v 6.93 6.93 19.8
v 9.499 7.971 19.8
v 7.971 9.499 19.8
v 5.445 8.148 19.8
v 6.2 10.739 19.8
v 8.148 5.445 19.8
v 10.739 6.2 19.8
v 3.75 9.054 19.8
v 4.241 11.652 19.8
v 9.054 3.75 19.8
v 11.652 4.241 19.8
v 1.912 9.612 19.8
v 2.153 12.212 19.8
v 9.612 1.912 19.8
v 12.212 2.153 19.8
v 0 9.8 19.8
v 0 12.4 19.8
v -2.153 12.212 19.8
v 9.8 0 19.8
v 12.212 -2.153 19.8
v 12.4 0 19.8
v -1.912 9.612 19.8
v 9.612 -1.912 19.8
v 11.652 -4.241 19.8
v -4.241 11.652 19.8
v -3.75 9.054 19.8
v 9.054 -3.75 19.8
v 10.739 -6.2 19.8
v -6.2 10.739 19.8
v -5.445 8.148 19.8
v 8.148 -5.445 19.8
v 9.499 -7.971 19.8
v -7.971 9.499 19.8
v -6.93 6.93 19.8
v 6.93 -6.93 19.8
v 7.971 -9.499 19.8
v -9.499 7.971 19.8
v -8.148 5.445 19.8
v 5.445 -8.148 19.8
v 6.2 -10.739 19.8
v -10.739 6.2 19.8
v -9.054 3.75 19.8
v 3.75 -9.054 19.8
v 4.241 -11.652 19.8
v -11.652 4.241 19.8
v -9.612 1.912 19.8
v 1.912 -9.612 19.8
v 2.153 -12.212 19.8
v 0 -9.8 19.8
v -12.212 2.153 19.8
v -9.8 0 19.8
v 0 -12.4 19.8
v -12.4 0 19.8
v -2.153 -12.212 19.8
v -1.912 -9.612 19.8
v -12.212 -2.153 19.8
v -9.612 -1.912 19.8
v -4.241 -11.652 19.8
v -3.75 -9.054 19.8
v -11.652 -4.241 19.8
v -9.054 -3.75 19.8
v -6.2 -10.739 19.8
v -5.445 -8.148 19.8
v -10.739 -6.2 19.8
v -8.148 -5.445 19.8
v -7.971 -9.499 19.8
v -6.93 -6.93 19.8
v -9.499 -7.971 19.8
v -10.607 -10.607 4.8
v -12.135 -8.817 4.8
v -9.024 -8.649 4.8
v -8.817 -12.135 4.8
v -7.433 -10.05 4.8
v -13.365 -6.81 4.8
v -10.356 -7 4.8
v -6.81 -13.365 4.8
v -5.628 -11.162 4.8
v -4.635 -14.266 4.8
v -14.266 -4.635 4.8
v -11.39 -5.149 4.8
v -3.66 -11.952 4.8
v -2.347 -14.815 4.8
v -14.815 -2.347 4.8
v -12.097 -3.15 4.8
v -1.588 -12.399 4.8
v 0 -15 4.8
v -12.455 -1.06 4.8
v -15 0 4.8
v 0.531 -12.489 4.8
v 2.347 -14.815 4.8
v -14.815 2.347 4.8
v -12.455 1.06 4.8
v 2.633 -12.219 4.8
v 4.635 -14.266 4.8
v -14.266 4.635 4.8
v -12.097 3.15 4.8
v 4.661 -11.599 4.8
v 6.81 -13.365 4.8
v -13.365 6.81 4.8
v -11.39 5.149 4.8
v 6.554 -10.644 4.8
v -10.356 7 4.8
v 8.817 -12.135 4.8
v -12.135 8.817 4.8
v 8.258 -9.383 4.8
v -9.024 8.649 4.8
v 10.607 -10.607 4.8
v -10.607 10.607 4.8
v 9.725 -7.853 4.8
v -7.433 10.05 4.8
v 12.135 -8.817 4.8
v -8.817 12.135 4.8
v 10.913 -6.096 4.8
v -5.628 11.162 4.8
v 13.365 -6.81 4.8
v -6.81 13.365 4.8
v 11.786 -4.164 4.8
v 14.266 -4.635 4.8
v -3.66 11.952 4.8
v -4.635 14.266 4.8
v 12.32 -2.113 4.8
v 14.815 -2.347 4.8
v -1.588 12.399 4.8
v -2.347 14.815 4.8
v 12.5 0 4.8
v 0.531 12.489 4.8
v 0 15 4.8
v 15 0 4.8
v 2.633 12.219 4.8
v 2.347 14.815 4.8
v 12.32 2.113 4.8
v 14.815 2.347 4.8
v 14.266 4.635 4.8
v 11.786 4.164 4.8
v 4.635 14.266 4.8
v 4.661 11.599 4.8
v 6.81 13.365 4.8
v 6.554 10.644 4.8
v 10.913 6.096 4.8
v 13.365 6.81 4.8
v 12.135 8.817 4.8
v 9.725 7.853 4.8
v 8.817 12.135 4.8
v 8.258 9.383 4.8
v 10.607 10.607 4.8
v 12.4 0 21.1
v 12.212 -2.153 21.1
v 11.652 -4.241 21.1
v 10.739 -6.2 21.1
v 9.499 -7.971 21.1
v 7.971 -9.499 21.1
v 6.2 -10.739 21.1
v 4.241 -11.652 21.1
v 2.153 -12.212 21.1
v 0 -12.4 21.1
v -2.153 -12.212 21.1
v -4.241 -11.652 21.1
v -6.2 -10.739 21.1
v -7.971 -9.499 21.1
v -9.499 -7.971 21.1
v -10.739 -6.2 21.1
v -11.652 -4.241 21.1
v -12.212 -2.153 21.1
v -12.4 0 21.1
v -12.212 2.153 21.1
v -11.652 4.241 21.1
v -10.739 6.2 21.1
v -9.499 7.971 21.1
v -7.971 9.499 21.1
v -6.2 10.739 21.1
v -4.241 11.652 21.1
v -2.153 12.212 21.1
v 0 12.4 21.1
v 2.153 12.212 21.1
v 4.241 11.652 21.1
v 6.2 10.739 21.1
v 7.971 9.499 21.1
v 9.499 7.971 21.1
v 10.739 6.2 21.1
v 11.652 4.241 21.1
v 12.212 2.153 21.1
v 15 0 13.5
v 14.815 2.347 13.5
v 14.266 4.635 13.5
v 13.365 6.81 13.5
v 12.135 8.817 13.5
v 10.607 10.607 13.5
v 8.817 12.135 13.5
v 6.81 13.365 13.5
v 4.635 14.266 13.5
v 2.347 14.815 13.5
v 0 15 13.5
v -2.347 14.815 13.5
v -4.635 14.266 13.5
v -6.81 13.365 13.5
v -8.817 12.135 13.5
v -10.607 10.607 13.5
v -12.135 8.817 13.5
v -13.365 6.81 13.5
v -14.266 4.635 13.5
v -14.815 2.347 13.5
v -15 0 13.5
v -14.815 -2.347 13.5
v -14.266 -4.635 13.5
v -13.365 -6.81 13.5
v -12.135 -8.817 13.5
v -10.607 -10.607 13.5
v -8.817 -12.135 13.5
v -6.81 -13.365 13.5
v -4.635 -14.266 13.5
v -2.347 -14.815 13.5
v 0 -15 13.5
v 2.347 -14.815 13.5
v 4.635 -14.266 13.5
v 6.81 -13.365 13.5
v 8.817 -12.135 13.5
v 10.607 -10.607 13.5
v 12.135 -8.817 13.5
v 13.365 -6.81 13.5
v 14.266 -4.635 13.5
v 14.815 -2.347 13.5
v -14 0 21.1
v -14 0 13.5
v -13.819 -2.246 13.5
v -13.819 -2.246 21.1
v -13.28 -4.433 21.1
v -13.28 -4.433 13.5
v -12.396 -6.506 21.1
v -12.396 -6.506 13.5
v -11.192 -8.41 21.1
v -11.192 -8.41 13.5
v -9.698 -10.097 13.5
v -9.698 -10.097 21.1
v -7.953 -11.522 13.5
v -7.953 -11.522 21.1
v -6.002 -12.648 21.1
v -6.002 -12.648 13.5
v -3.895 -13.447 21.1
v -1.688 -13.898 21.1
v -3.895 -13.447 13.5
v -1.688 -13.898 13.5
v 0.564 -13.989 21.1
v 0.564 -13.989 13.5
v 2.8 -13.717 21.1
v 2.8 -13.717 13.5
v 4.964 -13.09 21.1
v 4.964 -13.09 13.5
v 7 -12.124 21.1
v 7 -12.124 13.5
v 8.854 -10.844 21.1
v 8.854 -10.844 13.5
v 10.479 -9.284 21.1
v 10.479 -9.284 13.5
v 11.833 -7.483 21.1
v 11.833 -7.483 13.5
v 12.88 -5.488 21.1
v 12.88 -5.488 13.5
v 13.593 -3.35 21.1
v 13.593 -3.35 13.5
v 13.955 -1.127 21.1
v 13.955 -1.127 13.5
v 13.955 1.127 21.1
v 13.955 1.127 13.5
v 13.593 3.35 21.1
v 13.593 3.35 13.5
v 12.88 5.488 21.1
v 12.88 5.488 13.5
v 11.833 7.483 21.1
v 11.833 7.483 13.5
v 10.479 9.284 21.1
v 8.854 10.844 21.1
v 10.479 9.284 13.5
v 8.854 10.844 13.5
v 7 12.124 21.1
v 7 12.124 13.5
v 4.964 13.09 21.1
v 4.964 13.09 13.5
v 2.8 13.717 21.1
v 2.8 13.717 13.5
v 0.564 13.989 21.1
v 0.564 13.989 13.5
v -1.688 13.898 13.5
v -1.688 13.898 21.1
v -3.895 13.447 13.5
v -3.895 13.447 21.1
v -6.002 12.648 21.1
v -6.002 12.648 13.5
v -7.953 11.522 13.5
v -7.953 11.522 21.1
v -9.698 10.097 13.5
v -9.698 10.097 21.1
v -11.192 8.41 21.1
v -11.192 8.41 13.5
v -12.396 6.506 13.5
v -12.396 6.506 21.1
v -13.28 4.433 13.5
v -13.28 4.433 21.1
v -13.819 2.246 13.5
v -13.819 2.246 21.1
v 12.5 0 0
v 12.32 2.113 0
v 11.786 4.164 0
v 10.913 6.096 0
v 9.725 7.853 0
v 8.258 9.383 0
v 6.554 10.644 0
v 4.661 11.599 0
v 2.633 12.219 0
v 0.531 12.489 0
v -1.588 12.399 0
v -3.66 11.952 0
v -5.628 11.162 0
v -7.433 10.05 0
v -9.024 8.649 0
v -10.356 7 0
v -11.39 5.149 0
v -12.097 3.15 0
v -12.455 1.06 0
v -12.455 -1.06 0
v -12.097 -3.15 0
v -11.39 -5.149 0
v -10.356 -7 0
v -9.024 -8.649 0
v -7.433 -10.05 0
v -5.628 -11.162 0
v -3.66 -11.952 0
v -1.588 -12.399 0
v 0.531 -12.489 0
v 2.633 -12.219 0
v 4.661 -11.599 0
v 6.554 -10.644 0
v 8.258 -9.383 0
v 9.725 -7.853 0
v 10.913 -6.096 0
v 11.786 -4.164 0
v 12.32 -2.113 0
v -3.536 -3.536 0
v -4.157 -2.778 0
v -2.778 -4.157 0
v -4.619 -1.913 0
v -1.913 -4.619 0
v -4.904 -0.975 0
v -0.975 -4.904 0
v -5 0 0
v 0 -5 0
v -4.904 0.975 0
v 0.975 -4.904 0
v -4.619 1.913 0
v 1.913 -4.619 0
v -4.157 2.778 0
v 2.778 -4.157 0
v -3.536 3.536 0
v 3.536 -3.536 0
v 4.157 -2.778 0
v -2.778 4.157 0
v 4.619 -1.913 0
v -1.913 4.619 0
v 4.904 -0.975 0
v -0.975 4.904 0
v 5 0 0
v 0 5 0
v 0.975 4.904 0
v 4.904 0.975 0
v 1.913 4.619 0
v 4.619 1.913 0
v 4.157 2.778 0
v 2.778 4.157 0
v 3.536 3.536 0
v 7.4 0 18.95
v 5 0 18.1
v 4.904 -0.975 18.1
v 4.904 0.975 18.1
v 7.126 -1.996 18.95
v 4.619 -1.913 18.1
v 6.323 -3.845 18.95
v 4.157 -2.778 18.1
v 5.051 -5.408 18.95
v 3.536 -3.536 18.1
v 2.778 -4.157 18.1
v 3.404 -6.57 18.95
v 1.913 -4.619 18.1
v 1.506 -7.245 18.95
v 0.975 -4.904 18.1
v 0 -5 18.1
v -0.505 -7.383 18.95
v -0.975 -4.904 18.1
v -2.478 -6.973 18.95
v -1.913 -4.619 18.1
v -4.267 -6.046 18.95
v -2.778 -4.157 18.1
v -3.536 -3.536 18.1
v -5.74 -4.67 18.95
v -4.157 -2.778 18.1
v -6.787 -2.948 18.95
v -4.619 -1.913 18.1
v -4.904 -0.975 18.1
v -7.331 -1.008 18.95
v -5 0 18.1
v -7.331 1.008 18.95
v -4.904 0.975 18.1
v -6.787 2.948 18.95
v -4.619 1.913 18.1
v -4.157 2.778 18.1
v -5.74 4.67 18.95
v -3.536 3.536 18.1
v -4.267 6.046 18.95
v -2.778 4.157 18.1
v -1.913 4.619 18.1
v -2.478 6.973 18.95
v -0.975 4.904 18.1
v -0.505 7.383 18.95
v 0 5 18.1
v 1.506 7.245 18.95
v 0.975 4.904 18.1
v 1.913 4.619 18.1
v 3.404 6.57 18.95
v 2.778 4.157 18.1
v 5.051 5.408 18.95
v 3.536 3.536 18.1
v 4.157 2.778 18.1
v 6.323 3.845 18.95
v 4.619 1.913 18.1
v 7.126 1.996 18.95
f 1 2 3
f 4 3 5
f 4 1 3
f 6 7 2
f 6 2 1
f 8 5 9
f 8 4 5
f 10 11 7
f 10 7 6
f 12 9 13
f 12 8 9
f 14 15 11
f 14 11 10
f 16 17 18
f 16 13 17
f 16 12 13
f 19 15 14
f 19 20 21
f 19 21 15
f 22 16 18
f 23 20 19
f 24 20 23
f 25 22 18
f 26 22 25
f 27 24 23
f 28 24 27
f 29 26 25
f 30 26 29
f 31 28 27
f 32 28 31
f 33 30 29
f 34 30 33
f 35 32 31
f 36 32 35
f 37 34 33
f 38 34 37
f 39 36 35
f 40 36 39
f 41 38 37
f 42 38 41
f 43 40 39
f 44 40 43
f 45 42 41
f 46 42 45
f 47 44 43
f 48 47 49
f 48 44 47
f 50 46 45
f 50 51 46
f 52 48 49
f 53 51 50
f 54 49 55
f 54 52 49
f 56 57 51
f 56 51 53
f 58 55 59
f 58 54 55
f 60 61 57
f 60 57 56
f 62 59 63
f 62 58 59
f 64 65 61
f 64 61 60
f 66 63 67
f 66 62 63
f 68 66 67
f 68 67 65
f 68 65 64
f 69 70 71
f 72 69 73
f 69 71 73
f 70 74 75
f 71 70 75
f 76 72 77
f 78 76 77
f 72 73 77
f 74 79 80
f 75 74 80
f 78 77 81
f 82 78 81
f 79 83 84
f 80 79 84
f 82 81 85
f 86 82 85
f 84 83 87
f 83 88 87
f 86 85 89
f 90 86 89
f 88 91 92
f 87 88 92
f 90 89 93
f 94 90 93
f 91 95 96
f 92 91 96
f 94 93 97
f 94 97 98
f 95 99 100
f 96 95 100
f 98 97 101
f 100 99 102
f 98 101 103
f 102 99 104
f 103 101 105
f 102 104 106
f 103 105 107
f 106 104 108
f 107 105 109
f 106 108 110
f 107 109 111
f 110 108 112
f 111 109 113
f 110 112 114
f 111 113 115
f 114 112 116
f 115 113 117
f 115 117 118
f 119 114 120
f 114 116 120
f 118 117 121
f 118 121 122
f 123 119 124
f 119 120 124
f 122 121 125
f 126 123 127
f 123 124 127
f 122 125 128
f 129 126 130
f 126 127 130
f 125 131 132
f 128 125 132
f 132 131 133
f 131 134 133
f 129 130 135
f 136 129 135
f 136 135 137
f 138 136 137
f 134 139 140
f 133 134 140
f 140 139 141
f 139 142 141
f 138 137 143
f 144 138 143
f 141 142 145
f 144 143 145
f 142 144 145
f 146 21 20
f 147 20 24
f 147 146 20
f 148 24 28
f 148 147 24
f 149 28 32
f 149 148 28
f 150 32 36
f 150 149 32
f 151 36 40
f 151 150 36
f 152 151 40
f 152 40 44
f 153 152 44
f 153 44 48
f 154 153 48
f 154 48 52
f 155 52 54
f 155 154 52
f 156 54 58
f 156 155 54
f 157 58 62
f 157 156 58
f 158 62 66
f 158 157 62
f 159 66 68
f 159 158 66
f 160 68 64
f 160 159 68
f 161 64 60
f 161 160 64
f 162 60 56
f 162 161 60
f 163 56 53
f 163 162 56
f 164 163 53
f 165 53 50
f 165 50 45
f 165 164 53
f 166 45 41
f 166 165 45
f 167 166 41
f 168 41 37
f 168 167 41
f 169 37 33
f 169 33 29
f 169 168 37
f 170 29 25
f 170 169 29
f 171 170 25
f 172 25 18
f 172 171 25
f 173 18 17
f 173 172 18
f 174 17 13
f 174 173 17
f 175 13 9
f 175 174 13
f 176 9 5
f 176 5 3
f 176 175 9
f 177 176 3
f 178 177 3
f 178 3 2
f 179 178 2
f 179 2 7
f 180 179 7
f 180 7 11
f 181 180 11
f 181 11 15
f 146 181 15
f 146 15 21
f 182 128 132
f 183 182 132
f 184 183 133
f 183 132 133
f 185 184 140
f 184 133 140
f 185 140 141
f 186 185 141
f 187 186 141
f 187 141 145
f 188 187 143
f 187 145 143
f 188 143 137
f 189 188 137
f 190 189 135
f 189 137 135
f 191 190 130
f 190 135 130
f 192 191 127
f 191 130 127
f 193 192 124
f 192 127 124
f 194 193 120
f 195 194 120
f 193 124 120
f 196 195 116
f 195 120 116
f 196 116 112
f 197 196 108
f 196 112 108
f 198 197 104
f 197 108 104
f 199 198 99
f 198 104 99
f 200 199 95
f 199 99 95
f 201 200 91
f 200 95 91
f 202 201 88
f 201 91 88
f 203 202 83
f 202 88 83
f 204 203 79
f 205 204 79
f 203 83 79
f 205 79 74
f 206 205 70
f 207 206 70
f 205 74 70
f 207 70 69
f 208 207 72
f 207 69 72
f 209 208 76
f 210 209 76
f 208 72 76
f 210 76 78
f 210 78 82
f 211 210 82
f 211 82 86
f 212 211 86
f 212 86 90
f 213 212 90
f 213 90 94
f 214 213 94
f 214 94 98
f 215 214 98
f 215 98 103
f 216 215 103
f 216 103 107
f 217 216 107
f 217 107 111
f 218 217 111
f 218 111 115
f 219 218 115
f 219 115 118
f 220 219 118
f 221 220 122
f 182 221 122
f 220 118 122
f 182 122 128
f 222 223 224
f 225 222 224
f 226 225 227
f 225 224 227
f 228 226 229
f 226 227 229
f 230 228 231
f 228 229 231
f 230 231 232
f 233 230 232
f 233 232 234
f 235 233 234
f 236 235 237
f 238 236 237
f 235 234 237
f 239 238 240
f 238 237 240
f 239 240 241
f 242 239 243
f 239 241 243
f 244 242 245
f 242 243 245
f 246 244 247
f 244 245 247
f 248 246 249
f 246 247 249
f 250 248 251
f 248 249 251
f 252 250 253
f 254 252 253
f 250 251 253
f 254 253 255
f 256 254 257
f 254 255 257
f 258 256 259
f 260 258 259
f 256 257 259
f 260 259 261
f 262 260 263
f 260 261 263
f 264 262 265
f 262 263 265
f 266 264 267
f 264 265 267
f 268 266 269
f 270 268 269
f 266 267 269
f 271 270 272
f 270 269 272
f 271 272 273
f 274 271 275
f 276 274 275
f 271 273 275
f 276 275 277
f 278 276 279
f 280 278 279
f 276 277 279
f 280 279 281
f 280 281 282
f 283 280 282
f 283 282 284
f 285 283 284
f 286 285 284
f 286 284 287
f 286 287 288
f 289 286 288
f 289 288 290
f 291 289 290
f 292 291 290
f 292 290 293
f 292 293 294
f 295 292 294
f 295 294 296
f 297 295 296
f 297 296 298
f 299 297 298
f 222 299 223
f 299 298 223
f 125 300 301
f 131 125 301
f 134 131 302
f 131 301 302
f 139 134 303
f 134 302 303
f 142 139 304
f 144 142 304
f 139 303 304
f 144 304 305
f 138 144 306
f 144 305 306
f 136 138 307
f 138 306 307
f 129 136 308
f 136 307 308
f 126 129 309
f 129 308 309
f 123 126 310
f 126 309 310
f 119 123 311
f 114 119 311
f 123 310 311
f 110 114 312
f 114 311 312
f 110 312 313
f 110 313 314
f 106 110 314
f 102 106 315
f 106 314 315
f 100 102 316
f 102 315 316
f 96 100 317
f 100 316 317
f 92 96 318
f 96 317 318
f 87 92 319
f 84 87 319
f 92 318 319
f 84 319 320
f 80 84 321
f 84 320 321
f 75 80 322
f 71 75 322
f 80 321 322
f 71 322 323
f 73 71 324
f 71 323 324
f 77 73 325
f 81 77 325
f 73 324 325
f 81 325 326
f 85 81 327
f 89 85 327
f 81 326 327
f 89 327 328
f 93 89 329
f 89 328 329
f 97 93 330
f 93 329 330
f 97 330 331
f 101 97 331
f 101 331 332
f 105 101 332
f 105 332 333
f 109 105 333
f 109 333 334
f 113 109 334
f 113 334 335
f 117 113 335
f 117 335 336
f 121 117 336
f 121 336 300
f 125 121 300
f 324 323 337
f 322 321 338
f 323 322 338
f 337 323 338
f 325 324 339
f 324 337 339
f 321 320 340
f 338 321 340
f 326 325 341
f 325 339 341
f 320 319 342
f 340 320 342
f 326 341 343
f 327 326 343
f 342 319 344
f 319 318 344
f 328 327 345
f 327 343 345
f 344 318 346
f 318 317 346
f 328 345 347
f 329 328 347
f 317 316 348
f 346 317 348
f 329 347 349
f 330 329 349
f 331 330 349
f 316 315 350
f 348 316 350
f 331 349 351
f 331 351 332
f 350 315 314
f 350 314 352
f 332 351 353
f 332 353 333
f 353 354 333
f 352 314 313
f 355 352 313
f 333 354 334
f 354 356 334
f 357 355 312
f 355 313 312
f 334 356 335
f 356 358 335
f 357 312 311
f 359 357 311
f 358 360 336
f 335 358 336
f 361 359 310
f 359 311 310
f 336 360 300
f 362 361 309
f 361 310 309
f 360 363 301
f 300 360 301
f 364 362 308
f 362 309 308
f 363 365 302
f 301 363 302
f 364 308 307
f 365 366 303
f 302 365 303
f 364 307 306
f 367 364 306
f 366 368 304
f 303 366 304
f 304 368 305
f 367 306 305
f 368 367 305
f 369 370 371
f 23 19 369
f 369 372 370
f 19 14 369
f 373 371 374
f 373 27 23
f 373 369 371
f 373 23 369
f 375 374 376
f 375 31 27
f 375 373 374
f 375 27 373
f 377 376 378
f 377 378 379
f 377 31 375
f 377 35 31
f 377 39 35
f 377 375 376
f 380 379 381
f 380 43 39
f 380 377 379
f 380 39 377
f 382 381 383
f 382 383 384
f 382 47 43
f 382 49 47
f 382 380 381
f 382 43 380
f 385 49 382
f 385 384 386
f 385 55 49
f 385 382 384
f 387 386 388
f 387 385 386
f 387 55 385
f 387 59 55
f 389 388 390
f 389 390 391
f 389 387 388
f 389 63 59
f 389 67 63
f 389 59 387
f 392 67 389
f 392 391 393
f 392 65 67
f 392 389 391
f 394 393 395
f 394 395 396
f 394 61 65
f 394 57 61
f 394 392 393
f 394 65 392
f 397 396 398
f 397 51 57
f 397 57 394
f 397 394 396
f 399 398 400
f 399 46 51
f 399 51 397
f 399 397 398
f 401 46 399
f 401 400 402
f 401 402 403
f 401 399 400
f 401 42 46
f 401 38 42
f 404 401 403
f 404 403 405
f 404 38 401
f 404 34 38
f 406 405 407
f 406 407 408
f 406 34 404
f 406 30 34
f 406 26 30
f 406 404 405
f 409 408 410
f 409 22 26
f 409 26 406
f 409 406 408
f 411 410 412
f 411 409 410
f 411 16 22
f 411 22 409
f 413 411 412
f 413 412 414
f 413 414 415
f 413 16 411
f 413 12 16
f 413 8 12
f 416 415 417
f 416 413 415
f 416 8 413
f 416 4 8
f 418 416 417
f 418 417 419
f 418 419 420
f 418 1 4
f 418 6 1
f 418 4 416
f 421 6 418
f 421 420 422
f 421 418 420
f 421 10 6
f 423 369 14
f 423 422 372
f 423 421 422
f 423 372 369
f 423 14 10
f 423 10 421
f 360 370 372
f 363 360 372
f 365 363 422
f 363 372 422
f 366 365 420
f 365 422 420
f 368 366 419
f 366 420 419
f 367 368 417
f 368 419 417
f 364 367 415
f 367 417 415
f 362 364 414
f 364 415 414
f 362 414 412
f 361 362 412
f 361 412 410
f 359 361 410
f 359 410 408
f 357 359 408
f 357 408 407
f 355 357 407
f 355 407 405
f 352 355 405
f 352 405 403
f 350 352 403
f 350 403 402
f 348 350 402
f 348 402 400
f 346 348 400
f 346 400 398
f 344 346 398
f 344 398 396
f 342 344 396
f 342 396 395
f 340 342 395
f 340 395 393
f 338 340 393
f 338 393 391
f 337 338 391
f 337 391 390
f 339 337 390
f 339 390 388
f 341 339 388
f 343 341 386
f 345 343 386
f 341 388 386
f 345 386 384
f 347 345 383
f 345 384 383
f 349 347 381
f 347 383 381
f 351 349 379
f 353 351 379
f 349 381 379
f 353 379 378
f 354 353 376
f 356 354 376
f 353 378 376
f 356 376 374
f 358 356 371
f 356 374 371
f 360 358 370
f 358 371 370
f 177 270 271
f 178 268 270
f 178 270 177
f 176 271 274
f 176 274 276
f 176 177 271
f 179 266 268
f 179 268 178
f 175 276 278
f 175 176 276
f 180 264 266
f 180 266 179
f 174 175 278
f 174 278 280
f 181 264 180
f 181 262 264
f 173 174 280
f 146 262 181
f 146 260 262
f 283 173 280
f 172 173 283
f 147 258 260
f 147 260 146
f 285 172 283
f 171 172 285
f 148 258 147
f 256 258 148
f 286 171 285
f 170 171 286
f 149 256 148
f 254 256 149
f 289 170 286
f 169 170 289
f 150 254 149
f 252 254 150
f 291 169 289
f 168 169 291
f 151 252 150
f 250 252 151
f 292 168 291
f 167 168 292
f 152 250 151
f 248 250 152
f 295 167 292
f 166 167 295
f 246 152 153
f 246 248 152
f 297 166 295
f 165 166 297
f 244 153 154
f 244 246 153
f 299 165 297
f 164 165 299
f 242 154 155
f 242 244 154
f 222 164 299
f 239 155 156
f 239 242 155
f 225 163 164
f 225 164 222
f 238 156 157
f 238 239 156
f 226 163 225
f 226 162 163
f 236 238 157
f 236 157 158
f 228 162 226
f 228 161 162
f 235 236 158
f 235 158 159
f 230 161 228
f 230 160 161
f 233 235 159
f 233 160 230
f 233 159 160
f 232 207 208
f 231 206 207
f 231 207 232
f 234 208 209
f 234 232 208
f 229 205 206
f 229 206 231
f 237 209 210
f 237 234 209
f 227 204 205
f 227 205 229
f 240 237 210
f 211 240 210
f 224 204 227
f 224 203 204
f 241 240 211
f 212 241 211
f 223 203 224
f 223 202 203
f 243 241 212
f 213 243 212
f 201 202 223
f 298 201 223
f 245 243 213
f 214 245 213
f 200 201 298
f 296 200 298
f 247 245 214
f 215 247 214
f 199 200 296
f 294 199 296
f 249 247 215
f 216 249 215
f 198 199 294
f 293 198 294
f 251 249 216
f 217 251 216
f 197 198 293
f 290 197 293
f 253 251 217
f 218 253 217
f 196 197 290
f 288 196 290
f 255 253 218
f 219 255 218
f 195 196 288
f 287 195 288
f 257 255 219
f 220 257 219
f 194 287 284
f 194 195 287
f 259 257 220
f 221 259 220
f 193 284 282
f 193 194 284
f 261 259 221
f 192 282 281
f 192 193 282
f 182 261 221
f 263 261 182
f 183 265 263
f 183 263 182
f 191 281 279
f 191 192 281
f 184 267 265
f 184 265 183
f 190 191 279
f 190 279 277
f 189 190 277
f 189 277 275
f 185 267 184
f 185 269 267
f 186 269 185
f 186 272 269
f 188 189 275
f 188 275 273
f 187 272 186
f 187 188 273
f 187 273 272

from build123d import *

# Parameters (mm, degrees)
SKETCH_1_R          = 12.5
EXTRUDE_1_DEPTH     = 4.8
SKETCH_2_R          = 15
EXTRUDE_2_DEPTH     = 8.7
SKETCH_3_R          = 14
EXTRUDE_3_DEPTH     = 7.6
SKETCH_6_R          = 5
CUT_EXTRUDE_1_DEPTH = 28.885659397


with BuildPart() as part:
    # 스케치1 → 보스-돌출1 (new body)
    with BuildSketch(Plane.XY):
        Circle(SKETCH_1_R)
    extrude(amount=EXTRUDE_1_DEPTH)

    # 스케치2 → 보스-돌출2 (add)
    with BuildSketch(Plane.XY.offset(4.8)):
        Circle(SKETCH_2_R)
    extrude(amount=EXTRUDE_2_DEPTH)

    # 스케치3 → 보스-돌출3 (add)
    with BuildSketch(Plane.XY.offset(13.5)):
        with Locations(Location((0, 0, 0), (0, 0, 180))):
            Circle(SKETCH_3_R)
    extrude(amount=EXTRUDE_3_DEPTH)

    # 스케치5 → 컷-회전1 (revolve, cut)
    with BuildSketch(Plane(origin=(0, 0, 0), x_dir=(1, 0, 0), z_dir=(0, 1, 0))):
        Polygon((0, -18.1), (5, -18.1), (9.8, -19.8), (12.4, -19.8), (12.4, -21.829479187), (0, -21.829479187), align=None)
    revolve(axis=Axis((0, 0, 21.829479187), (0, 0, -1)), mode=Mode.SUBTRACT)

    # 스케치6 → 컷-돌출1 (cut, through all)
    with BuildSketch(Plane.XY.offset(18.1)):
        Circle(SKETCH_6_R)
    extrude(amount=-CUT_EXTRUDE_1_DEPTH, mode=Mode.SUBTRACT)


solid = part.part
